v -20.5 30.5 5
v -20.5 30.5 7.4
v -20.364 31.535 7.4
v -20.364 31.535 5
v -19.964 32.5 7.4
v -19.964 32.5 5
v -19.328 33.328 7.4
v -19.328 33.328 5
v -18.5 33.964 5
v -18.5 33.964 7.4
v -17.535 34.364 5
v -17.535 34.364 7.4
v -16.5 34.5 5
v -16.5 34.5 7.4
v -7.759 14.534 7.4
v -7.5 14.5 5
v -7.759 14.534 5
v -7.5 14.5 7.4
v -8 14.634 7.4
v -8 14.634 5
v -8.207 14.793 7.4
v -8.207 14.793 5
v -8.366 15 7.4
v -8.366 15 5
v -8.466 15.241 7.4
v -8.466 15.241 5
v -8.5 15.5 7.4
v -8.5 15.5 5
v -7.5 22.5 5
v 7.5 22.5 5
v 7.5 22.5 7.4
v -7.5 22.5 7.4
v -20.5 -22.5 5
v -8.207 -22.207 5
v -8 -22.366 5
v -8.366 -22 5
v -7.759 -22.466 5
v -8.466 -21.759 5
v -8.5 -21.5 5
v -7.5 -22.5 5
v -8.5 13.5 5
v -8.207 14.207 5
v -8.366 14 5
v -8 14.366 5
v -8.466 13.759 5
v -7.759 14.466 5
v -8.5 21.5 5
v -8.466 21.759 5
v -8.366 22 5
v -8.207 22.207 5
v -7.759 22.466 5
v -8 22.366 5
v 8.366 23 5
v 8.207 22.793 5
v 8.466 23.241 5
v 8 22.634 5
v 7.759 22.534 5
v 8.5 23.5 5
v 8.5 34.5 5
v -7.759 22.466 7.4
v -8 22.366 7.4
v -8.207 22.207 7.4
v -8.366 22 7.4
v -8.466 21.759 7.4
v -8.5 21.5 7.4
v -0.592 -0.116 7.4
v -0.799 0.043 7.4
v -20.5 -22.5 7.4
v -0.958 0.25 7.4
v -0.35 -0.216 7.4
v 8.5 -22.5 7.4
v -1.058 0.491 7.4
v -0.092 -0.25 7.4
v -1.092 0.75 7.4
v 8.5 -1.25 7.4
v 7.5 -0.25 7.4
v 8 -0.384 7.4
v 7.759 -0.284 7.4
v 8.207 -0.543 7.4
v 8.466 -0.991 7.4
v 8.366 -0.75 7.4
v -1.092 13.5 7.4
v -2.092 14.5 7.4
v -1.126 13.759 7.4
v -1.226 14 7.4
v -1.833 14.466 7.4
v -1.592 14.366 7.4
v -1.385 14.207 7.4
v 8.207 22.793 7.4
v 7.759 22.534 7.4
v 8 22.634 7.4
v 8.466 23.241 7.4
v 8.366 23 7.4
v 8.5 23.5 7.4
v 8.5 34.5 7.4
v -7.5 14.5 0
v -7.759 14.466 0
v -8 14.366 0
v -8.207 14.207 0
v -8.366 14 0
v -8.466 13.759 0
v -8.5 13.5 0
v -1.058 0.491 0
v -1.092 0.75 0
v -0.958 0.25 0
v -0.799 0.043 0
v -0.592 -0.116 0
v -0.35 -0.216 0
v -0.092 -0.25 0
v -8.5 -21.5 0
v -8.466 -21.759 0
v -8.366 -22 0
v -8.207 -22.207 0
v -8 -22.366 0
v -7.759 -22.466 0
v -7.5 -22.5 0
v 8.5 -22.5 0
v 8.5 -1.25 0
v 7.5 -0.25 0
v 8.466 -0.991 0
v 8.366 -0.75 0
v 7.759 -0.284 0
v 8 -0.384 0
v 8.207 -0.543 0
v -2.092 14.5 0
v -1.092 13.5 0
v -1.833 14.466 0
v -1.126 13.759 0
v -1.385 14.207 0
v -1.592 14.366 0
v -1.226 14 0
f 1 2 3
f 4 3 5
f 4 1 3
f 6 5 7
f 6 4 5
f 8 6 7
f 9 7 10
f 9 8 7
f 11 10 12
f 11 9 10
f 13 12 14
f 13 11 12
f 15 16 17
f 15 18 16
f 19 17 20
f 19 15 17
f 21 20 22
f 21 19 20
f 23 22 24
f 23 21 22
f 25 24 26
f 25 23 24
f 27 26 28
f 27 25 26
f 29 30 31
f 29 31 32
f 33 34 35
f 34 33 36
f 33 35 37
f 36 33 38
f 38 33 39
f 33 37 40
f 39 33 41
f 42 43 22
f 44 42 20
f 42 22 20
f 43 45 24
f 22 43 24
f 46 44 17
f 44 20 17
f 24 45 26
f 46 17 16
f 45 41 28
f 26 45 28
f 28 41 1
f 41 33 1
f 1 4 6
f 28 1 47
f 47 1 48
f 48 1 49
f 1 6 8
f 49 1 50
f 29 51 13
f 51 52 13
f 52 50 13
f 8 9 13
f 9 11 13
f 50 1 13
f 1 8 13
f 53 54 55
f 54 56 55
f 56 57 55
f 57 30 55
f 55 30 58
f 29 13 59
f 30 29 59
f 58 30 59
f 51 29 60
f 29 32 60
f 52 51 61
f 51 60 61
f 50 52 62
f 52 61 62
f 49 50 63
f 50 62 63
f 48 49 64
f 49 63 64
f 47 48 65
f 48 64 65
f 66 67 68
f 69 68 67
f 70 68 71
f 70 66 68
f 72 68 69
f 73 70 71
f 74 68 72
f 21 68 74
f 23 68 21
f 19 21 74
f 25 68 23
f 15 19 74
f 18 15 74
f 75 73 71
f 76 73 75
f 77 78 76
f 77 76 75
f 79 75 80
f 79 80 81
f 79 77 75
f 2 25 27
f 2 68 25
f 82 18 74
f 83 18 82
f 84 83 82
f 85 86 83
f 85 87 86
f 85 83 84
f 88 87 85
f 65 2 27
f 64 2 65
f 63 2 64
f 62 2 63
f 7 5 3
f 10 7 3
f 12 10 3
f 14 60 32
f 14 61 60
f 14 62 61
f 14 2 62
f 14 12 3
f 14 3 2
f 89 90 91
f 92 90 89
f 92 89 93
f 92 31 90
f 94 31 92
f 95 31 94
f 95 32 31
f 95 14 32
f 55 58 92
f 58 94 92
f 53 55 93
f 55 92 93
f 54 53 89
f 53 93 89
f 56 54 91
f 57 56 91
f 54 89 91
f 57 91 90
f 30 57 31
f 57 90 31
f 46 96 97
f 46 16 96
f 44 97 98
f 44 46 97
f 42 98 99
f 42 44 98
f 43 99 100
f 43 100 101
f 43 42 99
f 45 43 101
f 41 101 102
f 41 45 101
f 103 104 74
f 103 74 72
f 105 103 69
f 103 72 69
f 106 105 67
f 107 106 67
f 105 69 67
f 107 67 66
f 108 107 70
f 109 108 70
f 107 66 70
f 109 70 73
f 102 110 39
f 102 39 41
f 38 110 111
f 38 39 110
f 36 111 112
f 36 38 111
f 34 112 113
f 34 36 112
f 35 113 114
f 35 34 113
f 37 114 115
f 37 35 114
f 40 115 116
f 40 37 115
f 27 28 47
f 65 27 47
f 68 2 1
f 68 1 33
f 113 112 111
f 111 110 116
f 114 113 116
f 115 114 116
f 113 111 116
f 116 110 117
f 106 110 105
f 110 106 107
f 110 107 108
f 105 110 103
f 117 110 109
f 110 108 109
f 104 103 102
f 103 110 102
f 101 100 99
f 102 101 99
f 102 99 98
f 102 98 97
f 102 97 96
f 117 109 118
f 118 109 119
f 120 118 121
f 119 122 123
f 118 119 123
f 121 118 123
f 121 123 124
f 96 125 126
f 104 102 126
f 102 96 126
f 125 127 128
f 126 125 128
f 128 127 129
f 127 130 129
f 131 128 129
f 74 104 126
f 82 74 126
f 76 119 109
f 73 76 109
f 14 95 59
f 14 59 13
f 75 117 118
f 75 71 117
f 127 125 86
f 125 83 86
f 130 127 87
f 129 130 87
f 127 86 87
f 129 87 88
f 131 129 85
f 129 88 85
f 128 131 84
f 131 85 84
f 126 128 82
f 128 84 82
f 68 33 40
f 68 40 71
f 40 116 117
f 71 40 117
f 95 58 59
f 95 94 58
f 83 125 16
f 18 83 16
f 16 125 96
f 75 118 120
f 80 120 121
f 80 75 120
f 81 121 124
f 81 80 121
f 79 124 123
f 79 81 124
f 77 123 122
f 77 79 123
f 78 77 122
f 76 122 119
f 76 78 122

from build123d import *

# Parameters (mm, degrees)
SKETCH1_W           = 17
SKETCH1_H           = 45
BOSS_EXTRUDE1_DEPTH = 12
BOSS_EXTRUDE2_DEPTH = 7
FILLET1_R           = 4
CUT_EXTRUDE1_DEPTH  = 42.886752082
CUT_EXTRUDE2_START  = -4.6
CUT_EXTRUDE2_DEPTH  = 4.6
SKETCH5_W           = 8
SKETCH5_H           = 8
CUT_EXTRUDE3_DEPTH  = 41.807597332
FILLET2_R           = 1
FILLET3_R           = 1


with BuildPart() as part:
    # Sketch1 → Boss-Extrude1 (new body)
    with BuildSketch(Plane.XY):
        Rectangle(SKETCH1_W, SKETCH1_H)
    extrude(amount=BOSS_EXTRUDE1_DEPTH)

    # Sketch2 → Boss-Extrude2 (add)
    with BuildSketch(Plane.XY.offset(12)):
        Polygon((-8.5, -22.5), (-8.5, 22.5), (8.5, 22.5), (8.5, 34.5), (-20.5, 34.5), (-20.5, -22.5), align=None)
    extrude(amount=-BOSS_EXTRUDE2_DEPTH)

    # Fillet1
    fillet1_edges = [part.edges().sort_by_distance(p)[0] for p in [
        (-20.5, 34.5, 8.5),
    ]]
    fillet(fillet1_edges, radius=FILLET1_R)

    # Sketch3 → Cut-Extrude1 (cut, through all)
    with BuildSketch(Plane(origin=(0, 0, 0), x_dir=(-1, 0, 0), z_dir=(0, 0, -1))):
        Polygon((-2.5, -0.25), (1.091673087, -0.25), (1.091673087, 22.5), (-8.5, 22.5), (-8.5, -0.25), (-3.5, -0.25), align=None)
    extrude(amount=-CUT_EXTRUDE1_DEPTH, mode=Mode.SUBTRACT)

    # Sketch4 → Cut-Extrude2 (cut)
    with BuildSketch(Plane.XY.offset(12).offset(CUT_EXTRUDE2_START)):
        with BuildLine():
            Line((-1.091673087, -0.25), (-1.091673087, 22.5))
            Line((-1.091673087, 22.5), (8.5, 22.5))
            Line((8.5, 22.5), (8.5, 34.5))
            Line((8.5, 34.5), (-16.5, 34.5))
            ThreePointArc((-16.5, 34.5), (-19.328427125, 33.328427125), (-20.5, 30.5))
            Line((-20.5, 30.5), (-20.5, -22.5))
            Line((-20.5, -22.5), (8.5, -22.5))
            Line((8.5, -22.5), (8.5, -0.25))
            Line((8.5, -0.25), (-1.091673087, -0.25))
        make_face()
    extrude(amount=CUT_EXTRUDE2_DEPTH, mode=Mode.SUBTRACT)

    # Sketch5 → Cut-Extrude3 (cut, through all)
    with BuildSketch(Plane(origin=(0, 0, 0), x_dir=(-1, 0, 0), z_dir=(0, 0, -1))):
        with Locations((4.5, 18.5)):
            Rectangle(SKETCH5_W, SKETCH5_H)
    extrude(amount=-CUT_EXTRUDE3_DEPTH, mode=Mode.SUBTRACT)

    # Fillet2
    fillet2_edges = [part.edges().sort_by_distance(p)[0] for p in [
        (-8.5, 22.5, 6.2),
        (-8.5, 14.5, 6.2),
        (-1.091673087, 14.5, 3.7),
        (-1.091673087, -0.25, 3.7),
        (8.5, -0.25, 3.7),
        (8.5, 22.5, 6.2),
    ]]
    fillet(fillet2_edges, radius=FILLET2_R)

    # Fillet3
    fillet3_edges = [part.edges().sort_by_distance(p)[0] for p in [
        (-8.5, -22.5, 2.5),
        (-8.5, 14.5, 2.5),
    ]]
    fillet(fillet3_edges, radius=FILLET3_R)


solid = part.part
